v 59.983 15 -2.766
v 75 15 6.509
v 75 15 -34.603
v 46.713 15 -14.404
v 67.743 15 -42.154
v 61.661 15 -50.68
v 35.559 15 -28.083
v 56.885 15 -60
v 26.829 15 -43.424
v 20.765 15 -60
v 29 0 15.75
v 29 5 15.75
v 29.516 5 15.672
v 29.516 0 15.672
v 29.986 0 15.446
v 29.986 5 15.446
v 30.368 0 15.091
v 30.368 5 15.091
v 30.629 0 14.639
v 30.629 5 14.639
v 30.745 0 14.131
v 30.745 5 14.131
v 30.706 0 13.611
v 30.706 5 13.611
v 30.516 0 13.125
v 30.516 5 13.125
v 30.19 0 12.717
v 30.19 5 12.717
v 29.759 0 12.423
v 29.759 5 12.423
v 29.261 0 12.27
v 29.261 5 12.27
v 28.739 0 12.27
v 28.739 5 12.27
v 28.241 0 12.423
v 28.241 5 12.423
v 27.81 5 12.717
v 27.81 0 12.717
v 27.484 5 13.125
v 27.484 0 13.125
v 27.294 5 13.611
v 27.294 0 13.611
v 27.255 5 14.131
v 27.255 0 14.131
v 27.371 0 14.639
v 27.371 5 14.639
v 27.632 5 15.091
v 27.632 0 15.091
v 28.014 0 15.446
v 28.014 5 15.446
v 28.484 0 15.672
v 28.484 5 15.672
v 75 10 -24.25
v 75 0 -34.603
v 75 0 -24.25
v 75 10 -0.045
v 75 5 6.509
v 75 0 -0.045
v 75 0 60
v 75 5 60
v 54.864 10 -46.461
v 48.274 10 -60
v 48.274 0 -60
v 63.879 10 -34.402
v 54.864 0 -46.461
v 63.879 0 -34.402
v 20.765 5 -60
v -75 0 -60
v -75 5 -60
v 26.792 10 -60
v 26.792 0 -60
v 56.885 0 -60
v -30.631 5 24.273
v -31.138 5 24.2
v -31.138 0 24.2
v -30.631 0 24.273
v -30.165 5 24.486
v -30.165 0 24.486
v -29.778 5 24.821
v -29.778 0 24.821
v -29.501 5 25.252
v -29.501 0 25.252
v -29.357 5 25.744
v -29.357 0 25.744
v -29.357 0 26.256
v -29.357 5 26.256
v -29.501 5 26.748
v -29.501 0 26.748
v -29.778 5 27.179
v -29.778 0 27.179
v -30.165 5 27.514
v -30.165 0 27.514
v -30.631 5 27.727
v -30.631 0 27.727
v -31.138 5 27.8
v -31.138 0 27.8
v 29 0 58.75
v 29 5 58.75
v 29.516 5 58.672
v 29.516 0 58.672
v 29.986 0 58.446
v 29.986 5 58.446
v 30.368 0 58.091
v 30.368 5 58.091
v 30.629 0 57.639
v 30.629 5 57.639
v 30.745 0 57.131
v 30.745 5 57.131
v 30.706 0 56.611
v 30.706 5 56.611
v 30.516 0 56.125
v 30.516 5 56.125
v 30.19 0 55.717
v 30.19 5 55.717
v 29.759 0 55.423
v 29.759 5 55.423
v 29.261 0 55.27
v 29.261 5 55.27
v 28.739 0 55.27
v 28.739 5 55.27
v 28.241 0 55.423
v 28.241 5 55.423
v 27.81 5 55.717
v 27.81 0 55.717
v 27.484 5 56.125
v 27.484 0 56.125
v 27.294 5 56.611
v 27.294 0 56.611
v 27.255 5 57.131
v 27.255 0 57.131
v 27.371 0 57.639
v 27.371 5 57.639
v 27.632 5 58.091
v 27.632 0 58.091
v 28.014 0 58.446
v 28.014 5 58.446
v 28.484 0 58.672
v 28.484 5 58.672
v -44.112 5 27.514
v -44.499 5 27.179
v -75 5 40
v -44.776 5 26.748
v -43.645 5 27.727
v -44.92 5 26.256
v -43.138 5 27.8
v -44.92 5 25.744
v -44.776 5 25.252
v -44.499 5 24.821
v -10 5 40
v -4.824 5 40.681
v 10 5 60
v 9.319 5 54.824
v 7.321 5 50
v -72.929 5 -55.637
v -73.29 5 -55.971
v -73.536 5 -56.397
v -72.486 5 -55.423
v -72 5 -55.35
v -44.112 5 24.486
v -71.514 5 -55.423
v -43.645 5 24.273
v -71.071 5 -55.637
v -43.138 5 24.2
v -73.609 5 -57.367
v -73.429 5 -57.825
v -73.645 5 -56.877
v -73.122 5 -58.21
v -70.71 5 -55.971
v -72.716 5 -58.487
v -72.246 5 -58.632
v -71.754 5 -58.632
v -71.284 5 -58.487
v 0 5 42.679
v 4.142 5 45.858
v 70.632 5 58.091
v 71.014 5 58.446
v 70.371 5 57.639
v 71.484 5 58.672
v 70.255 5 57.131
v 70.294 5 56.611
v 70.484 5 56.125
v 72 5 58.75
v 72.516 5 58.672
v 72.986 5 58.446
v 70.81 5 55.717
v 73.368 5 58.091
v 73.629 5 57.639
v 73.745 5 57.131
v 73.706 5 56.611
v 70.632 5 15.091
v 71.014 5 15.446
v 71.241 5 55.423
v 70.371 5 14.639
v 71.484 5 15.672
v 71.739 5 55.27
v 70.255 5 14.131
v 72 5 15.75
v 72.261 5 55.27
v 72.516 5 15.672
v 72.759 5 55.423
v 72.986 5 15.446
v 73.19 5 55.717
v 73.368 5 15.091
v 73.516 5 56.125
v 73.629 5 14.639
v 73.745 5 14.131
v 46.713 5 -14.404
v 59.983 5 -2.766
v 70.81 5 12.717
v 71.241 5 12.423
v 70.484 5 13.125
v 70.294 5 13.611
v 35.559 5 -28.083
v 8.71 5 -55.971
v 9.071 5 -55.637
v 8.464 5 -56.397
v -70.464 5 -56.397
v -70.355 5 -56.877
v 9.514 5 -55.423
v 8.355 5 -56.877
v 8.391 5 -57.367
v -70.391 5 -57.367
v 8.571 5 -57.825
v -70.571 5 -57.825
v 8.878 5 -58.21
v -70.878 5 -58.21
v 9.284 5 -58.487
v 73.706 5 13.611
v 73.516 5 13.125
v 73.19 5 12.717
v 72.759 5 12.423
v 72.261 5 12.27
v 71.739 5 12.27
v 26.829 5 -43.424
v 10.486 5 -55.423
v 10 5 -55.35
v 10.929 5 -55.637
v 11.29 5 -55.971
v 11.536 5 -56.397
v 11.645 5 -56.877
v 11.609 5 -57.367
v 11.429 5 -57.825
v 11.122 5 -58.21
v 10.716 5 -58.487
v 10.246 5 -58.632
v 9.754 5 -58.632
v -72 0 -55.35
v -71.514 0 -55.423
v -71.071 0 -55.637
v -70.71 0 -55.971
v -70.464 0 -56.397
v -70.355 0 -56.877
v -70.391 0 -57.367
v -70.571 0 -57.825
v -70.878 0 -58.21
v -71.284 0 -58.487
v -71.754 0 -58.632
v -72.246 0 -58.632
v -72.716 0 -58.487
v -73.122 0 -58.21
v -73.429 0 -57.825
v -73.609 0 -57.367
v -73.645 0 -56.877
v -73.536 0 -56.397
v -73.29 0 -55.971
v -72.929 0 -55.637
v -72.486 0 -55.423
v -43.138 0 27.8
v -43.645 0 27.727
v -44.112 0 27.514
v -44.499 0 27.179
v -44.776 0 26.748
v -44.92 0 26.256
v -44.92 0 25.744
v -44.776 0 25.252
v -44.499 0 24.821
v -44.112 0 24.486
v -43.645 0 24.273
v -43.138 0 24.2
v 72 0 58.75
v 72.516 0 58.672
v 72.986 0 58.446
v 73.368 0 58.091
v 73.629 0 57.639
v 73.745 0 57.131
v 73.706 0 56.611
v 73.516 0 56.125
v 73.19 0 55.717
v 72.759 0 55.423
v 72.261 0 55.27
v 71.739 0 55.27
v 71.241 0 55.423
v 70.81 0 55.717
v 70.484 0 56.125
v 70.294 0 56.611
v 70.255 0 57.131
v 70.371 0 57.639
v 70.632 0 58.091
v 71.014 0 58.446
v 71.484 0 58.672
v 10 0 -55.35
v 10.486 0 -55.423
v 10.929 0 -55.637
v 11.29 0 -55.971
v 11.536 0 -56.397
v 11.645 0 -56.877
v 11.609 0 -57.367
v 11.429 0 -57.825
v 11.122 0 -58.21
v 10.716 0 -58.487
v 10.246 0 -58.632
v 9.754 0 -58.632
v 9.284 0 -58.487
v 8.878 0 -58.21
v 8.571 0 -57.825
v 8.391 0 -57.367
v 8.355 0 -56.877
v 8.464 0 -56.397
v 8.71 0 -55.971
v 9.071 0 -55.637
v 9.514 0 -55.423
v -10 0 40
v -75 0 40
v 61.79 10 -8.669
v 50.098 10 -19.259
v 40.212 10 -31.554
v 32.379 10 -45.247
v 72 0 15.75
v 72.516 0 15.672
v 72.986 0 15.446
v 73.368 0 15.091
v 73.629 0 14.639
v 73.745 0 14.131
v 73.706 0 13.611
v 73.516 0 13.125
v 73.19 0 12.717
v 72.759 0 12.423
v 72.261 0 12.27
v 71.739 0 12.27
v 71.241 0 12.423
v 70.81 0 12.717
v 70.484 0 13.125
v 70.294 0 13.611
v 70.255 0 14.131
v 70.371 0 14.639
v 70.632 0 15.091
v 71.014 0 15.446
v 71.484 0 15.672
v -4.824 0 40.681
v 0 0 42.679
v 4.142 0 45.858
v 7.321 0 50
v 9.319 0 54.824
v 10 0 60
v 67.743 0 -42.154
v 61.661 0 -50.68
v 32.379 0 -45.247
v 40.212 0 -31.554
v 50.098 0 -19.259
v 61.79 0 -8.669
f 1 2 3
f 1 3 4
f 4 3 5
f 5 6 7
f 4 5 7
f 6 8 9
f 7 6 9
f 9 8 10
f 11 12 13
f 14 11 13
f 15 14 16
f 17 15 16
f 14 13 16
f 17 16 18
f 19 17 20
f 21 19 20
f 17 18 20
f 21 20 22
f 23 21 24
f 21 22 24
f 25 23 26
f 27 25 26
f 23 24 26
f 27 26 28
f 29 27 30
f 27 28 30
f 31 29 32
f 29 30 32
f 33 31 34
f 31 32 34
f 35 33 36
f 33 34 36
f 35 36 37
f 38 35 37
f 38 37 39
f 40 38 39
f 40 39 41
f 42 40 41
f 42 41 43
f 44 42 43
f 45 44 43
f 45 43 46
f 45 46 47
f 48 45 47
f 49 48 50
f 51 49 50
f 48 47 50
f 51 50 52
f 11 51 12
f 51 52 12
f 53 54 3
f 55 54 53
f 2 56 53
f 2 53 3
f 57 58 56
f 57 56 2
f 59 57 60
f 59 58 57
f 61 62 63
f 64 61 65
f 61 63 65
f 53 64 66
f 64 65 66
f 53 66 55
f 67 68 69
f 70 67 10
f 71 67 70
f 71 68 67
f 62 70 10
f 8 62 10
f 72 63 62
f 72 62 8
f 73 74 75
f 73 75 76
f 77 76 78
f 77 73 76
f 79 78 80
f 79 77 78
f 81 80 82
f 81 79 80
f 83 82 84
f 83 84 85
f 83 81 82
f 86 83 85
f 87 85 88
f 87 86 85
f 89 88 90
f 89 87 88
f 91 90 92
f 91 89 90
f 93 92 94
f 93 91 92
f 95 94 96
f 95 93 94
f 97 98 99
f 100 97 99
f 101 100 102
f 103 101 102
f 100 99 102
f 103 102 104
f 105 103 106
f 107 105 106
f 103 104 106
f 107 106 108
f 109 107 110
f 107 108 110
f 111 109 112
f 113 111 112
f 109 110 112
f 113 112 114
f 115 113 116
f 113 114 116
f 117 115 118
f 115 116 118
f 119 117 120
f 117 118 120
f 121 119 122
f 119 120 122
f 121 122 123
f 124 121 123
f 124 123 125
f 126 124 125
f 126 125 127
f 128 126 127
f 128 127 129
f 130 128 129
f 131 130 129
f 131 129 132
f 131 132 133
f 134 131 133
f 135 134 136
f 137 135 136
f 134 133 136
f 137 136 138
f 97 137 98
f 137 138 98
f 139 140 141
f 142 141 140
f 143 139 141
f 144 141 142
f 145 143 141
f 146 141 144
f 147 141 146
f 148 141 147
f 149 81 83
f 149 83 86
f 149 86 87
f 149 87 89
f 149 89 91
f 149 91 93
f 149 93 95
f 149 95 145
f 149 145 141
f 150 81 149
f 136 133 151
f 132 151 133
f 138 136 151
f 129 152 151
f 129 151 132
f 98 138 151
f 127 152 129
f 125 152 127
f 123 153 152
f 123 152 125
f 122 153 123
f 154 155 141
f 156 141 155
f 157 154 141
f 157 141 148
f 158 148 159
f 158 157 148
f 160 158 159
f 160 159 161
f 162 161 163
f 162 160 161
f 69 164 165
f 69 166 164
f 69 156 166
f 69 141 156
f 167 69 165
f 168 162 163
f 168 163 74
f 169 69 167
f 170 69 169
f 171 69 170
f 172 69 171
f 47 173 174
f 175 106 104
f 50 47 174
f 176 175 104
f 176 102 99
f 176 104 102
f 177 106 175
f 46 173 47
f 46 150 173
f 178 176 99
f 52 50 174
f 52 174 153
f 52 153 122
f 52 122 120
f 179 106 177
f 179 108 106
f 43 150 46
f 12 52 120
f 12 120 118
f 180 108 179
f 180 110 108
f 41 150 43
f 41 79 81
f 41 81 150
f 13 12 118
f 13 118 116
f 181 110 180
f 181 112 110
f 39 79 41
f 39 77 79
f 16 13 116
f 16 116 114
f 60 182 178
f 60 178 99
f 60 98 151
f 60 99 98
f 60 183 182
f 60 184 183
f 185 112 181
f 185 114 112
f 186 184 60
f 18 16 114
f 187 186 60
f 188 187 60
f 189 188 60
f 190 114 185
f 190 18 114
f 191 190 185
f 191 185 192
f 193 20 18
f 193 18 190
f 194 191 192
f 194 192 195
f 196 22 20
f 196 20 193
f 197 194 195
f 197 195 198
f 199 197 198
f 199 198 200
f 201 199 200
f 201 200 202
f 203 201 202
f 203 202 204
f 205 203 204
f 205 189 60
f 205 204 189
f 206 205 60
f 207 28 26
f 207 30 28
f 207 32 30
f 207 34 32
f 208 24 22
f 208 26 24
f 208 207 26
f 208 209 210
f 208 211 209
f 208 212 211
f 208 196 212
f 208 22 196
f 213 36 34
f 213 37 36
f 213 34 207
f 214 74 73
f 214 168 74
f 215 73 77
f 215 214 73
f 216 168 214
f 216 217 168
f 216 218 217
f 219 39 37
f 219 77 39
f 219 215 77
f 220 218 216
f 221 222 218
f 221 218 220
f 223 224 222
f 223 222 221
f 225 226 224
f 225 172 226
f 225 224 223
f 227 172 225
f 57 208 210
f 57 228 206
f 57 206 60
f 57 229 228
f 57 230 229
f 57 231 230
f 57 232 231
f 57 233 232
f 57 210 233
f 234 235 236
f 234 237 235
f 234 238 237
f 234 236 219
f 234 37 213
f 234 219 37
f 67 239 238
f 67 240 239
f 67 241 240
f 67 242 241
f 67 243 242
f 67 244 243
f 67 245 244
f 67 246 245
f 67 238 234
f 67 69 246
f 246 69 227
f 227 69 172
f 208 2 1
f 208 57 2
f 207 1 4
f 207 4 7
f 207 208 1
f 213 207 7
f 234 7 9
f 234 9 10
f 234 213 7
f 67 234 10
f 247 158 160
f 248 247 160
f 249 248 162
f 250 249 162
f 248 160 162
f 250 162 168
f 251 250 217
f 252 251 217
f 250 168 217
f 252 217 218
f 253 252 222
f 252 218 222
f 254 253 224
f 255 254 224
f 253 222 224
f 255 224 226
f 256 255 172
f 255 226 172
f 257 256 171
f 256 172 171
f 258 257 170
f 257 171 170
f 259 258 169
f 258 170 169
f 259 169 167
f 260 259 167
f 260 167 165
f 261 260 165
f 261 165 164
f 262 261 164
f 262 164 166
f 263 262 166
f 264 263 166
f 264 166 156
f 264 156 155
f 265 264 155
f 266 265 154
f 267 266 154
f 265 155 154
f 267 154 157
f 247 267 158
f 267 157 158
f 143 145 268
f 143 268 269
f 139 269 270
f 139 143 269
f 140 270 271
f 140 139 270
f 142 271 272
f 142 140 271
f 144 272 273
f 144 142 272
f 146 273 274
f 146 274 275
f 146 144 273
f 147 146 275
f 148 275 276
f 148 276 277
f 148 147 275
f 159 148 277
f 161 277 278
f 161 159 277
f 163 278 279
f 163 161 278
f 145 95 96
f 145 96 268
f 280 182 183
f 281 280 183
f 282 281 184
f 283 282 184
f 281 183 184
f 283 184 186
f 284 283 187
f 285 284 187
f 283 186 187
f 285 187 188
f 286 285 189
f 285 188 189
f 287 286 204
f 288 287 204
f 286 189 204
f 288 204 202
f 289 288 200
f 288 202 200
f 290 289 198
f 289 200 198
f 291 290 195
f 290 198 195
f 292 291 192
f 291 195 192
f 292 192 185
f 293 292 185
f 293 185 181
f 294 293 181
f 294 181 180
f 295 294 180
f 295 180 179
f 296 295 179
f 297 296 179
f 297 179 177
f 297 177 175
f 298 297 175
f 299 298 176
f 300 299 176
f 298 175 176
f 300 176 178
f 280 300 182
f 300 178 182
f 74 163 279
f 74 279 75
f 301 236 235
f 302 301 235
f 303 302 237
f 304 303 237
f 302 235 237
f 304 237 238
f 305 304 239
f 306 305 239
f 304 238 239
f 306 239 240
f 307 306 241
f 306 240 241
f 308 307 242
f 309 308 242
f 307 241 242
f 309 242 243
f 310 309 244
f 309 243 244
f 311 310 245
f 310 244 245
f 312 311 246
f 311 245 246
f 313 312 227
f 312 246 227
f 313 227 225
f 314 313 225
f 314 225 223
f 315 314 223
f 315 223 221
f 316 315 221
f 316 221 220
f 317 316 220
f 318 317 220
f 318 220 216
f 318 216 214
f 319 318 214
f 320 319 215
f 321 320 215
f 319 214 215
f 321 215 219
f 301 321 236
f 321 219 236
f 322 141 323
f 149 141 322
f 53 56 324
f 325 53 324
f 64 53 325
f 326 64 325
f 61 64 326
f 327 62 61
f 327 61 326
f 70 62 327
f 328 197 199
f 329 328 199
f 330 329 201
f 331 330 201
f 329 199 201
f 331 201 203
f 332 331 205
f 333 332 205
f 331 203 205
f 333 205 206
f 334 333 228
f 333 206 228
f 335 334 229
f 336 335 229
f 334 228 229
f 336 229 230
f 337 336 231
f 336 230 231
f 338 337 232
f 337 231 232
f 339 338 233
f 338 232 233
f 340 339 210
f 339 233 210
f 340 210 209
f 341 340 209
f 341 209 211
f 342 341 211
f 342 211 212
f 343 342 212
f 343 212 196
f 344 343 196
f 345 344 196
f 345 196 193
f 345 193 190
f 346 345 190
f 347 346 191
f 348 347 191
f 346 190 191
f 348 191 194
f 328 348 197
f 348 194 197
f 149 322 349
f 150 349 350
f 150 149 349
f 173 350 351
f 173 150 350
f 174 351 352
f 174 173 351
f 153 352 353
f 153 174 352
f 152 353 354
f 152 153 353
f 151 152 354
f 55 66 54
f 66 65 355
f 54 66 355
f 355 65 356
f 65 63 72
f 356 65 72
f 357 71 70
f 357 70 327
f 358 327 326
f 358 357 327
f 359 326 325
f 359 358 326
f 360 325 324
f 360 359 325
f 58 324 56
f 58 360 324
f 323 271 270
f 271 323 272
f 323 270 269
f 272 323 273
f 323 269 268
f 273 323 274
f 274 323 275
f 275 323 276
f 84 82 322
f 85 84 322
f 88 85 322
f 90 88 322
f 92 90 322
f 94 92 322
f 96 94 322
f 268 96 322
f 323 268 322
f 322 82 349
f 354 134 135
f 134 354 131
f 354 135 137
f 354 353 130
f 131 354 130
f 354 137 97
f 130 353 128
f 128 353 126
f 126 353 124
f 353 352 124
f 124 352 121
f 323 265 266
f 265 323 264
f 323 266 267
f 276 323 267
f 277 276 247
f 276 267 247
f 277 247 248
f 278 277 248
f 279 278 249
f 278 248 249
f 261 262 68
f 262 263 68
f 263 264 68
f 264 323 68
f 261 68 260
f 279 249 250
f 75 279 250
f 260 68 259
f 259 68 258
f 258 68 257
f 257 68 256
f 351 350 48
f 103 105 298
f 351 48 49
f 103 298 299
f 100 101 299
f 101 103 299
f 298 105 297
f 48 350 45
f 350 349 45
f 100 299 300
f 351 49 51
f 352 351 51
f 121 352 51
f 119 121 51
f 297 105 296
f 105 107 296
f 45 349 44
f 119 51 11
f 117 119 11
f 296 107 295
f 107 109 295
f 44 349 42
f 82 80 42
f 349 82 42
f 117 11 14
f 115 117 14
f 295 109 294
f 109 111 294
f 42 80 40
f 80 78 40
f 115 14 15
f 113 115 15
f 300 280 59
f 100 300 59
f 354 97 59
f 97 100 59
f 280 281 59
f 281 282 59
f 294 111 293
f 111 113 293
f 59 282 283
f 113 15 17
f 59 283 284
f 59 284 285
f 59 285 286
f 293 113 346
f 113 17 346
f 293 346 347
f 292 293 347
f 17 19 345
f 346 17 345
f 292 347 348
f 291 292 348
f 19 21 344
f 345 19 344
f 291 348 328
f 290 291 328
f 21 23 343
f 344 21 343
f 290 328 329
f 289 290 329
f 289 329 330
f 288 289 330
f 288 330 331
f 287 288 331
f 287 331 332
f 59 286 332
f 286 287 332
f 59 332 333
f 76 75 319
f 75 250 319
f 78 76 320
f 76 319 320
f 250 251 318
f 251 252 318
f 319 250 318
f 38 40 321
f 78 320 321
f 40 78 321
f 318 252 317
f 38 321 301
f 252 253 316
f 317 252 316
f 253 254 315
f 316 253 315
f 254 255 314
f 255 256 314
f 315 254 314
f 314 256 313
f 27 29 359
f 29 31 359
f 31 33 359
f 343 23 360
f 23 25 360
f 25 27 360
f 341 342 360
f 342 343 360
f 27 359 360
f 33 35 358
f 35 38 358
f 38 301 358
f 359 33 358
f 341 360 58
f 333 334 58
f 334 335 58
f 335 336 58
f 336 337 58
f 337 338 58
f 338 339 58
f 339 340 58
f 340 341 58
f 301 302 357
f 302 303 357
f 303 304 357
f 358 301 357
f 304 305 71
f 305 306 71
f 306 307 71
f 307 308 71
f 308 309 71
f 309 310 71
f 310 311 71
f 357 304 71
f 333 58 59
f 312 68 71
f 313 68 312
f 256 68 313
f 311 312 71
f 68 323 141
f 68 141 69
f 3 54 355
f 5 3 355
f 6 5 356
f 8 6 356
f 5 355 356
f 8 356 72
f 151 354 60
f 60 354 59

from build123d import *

# Parameters (mm, degrees)
SKETCH_2_W          = 150
SKETCH_2_H          = 120
EXTRUDE_1_DEPTH     = 5
SKETCH_3_R          = 1.65
SKETCH_3_R_2        = 1.75
CUT_EXTRUDE_1_DEPTH = 5
EXTRUDE_3_DEPTH     = 5
EXTRUDE_4_DEPTH     = 5
CUT_EXTRUDE_START   = -5
CUT_EXTRUDE_2_DEPTH = 5
CUT_EXTRUDE_4_DEPTH = 20
CUT_EXTRUDE_5_DEPTH = 10


with BuildPart() as part:
    # 草图2 → 凸台-拉伸1 (new body)
    with BuildSketch(Plane(origin=(0, 0, 0), x_dir=(1, 0, 0), z_dir=(0, 1, 0))):
        Rectangle(SKETCH_2_W, SKETCH_2_H)
    extrude(amount=EXTRUDE_1_DEPTH)

    # 草图3 → 切除-拉伸1 (cut)
    with BuildSketch(Plane(origin=(0, 5, 0), x_dir=(1, 0, 0), z_dir=(0, 1, 0))):
        with Locations(Location((-72, 57, 0), (0, 0, 270))):
            Circle(SKETCH_3_R)
        with Locations(Location((10, 57, 0), (0, 0, 270))):
            Circle(SKETCH_3_R)
        with Locations(Location((72, -57, 0), (0, 0, 270))):
            Circle(SKETCH_3_R_2)
        with Locations(Location((29, -57, 0), (0, 0, 270))):
            Circle(SKETCH_3_R_2)
        with Locations(Location((72, -14, 0), (0, 0, 270))):
            Circle(SKETCH_3_R_2)
        with Locations(Location((29, -14, 0), (0, 0, 270))):
            Circle(SKETCH_3_R_2)
        with BuildLine():
            Line((-43.138351407, -24.2), (-31.138351407, -24.2))
            ThreePointArc((-31.138351407, -24.2), (-29.338351407, -26), (-31.138351407, -27.8))
            Line((-31.138351407, -27.8), (-43.138351407, -27.8))
            ThreePointArc((-43.138351407, -27.8), (-44.938351407, -26), (-43.138351407, -24.2))
        make_face()
    extrude(amount=-CUT_EXTRUDE_1_DEPTH, mode=Mode.SUBTRACT)

    # 草图4 → 凸台-拉伸3 (add)
    with BuildSketch(Plane(origin=(0, 5, 0), x_dir=(1, 0, 0), z_dir=(0, 1, 0))):
        with BuildLine():
            Line((75, 24.250176471), (75, 60))
            Line((75, 60), (48.273565588, 60))
            ThreePointArc((48.273565588, 60), (59.086332475, 40.218381113), (75, 24.250176471))
        make_face()
        with BuildLine():
            Line((75, -6.509258806), (75, 0.045238901))
            ThreePointArc((75, 0.045238901), (44.912530325, 25.211568901), (26.791684351, 60))
            Line((26.791684351, 60), (20.764976647, 60))
            ThreePointArc((20.764976647, 60), (40.850679022, 21.0112766), (75, -6.509258806))
        make_face()
    extrude(amount=EXTRUDE_3_DEPTH)

    # 草图5 → 凸台-拉伸4 (add)
    with BuildSketch(Plane(origin=(0, 10, 0), x_dir=(1, 0, 0), z_dir=(0, 1, 0))):
        with BuildLine():
            Line((20.764976647, 60), (75, 60))
            Line((75, 60), (75, -6.509258806))
            ThreePointArc((75, -6.509258806), (40.850679022, 21.0112766), (20.764976647, 60))
        make_face()
    extrude(amount=EXTRUDE_4_DEPTH)

    # 草图6 → 切除-拉伸2 (cut)
    with BuildSketch(Plane(origin=(0, 5, 0), x_dir=(1, 0, 0), z_dir=(0, 1, 0)).offset(CUT_EXTRUDE_START)):
        with BuildLine():
            Line((48.273565588, 60), (26.791684351, 60))
            ThreePointArc((26.791684351, 60), (44.912530325, 25.211568901), (75, 0.045238901))
            Line((75, 0.045238901), (75, 24.250176471))
            ThreePointArc((75, 24.250176471), (59.086332475, 40.218381113), (48.273565588, 60))
        make_face()
    extrude(amount=CUT_EXTRUDE_2_DEPTH, mode=Mode.SUBTRACT)

    # 草图7 → 切除-拉伸4 (cut)
    with BuildSketch(Plane.XZ):
        with BuildLine():
            ThreePointArc((56.884646261, -60), (56.310021612, -61.397616975), (55.764937458, -62.807017544))
            Line((55.764937458, -62.807017544), (81.923412231, -71.445579772))
            Line((81.923412231, -71.445579772), (79.812030075, -30.641136223))
            ThreePointArc((79.812030075, -30.641136223), (77.363002414, -32.56982364), (75, -34.602996339))
            Line((75, -34.602996339), (75, -60))
            Line((75, -60), (56.884646261, -60))
        make_face()
        with BuildLine():
            ThreePointArc((75, -34.602996339), (64.546339392, -46.305761051), (56.884646261, -60))
            Line((56.884646261, -60), (75, -60))
            Line((75, -60), (75, -34.602996339))
        make_face()
    extrude(amount=-CUT_EXTRUDE_4_DEPTH, mode=Mode.SUBTRACT)

    # 草图8 → 切除-拉伸5 (cut)
    with BuildSketch(Plane(origin=(0, 5, 0), x_dir=(1, 0, 0), z_dir=(0, 1, 0))):
        with BuildLine():
            Line((-75, -40), (-10, -40))
            ThreePointArc((-10, -40), (10, -60), (-10, -80))
            Line((-10, -80), (-75, -80))
            ThreePointArc((-75, -80), (-95, -60), (-75, -40))
        make_face()
    extrude(amount=-CUT_EXTRUDE_5_DEPTH, mode=Mode.SUBTRACT)


solid = part.part
